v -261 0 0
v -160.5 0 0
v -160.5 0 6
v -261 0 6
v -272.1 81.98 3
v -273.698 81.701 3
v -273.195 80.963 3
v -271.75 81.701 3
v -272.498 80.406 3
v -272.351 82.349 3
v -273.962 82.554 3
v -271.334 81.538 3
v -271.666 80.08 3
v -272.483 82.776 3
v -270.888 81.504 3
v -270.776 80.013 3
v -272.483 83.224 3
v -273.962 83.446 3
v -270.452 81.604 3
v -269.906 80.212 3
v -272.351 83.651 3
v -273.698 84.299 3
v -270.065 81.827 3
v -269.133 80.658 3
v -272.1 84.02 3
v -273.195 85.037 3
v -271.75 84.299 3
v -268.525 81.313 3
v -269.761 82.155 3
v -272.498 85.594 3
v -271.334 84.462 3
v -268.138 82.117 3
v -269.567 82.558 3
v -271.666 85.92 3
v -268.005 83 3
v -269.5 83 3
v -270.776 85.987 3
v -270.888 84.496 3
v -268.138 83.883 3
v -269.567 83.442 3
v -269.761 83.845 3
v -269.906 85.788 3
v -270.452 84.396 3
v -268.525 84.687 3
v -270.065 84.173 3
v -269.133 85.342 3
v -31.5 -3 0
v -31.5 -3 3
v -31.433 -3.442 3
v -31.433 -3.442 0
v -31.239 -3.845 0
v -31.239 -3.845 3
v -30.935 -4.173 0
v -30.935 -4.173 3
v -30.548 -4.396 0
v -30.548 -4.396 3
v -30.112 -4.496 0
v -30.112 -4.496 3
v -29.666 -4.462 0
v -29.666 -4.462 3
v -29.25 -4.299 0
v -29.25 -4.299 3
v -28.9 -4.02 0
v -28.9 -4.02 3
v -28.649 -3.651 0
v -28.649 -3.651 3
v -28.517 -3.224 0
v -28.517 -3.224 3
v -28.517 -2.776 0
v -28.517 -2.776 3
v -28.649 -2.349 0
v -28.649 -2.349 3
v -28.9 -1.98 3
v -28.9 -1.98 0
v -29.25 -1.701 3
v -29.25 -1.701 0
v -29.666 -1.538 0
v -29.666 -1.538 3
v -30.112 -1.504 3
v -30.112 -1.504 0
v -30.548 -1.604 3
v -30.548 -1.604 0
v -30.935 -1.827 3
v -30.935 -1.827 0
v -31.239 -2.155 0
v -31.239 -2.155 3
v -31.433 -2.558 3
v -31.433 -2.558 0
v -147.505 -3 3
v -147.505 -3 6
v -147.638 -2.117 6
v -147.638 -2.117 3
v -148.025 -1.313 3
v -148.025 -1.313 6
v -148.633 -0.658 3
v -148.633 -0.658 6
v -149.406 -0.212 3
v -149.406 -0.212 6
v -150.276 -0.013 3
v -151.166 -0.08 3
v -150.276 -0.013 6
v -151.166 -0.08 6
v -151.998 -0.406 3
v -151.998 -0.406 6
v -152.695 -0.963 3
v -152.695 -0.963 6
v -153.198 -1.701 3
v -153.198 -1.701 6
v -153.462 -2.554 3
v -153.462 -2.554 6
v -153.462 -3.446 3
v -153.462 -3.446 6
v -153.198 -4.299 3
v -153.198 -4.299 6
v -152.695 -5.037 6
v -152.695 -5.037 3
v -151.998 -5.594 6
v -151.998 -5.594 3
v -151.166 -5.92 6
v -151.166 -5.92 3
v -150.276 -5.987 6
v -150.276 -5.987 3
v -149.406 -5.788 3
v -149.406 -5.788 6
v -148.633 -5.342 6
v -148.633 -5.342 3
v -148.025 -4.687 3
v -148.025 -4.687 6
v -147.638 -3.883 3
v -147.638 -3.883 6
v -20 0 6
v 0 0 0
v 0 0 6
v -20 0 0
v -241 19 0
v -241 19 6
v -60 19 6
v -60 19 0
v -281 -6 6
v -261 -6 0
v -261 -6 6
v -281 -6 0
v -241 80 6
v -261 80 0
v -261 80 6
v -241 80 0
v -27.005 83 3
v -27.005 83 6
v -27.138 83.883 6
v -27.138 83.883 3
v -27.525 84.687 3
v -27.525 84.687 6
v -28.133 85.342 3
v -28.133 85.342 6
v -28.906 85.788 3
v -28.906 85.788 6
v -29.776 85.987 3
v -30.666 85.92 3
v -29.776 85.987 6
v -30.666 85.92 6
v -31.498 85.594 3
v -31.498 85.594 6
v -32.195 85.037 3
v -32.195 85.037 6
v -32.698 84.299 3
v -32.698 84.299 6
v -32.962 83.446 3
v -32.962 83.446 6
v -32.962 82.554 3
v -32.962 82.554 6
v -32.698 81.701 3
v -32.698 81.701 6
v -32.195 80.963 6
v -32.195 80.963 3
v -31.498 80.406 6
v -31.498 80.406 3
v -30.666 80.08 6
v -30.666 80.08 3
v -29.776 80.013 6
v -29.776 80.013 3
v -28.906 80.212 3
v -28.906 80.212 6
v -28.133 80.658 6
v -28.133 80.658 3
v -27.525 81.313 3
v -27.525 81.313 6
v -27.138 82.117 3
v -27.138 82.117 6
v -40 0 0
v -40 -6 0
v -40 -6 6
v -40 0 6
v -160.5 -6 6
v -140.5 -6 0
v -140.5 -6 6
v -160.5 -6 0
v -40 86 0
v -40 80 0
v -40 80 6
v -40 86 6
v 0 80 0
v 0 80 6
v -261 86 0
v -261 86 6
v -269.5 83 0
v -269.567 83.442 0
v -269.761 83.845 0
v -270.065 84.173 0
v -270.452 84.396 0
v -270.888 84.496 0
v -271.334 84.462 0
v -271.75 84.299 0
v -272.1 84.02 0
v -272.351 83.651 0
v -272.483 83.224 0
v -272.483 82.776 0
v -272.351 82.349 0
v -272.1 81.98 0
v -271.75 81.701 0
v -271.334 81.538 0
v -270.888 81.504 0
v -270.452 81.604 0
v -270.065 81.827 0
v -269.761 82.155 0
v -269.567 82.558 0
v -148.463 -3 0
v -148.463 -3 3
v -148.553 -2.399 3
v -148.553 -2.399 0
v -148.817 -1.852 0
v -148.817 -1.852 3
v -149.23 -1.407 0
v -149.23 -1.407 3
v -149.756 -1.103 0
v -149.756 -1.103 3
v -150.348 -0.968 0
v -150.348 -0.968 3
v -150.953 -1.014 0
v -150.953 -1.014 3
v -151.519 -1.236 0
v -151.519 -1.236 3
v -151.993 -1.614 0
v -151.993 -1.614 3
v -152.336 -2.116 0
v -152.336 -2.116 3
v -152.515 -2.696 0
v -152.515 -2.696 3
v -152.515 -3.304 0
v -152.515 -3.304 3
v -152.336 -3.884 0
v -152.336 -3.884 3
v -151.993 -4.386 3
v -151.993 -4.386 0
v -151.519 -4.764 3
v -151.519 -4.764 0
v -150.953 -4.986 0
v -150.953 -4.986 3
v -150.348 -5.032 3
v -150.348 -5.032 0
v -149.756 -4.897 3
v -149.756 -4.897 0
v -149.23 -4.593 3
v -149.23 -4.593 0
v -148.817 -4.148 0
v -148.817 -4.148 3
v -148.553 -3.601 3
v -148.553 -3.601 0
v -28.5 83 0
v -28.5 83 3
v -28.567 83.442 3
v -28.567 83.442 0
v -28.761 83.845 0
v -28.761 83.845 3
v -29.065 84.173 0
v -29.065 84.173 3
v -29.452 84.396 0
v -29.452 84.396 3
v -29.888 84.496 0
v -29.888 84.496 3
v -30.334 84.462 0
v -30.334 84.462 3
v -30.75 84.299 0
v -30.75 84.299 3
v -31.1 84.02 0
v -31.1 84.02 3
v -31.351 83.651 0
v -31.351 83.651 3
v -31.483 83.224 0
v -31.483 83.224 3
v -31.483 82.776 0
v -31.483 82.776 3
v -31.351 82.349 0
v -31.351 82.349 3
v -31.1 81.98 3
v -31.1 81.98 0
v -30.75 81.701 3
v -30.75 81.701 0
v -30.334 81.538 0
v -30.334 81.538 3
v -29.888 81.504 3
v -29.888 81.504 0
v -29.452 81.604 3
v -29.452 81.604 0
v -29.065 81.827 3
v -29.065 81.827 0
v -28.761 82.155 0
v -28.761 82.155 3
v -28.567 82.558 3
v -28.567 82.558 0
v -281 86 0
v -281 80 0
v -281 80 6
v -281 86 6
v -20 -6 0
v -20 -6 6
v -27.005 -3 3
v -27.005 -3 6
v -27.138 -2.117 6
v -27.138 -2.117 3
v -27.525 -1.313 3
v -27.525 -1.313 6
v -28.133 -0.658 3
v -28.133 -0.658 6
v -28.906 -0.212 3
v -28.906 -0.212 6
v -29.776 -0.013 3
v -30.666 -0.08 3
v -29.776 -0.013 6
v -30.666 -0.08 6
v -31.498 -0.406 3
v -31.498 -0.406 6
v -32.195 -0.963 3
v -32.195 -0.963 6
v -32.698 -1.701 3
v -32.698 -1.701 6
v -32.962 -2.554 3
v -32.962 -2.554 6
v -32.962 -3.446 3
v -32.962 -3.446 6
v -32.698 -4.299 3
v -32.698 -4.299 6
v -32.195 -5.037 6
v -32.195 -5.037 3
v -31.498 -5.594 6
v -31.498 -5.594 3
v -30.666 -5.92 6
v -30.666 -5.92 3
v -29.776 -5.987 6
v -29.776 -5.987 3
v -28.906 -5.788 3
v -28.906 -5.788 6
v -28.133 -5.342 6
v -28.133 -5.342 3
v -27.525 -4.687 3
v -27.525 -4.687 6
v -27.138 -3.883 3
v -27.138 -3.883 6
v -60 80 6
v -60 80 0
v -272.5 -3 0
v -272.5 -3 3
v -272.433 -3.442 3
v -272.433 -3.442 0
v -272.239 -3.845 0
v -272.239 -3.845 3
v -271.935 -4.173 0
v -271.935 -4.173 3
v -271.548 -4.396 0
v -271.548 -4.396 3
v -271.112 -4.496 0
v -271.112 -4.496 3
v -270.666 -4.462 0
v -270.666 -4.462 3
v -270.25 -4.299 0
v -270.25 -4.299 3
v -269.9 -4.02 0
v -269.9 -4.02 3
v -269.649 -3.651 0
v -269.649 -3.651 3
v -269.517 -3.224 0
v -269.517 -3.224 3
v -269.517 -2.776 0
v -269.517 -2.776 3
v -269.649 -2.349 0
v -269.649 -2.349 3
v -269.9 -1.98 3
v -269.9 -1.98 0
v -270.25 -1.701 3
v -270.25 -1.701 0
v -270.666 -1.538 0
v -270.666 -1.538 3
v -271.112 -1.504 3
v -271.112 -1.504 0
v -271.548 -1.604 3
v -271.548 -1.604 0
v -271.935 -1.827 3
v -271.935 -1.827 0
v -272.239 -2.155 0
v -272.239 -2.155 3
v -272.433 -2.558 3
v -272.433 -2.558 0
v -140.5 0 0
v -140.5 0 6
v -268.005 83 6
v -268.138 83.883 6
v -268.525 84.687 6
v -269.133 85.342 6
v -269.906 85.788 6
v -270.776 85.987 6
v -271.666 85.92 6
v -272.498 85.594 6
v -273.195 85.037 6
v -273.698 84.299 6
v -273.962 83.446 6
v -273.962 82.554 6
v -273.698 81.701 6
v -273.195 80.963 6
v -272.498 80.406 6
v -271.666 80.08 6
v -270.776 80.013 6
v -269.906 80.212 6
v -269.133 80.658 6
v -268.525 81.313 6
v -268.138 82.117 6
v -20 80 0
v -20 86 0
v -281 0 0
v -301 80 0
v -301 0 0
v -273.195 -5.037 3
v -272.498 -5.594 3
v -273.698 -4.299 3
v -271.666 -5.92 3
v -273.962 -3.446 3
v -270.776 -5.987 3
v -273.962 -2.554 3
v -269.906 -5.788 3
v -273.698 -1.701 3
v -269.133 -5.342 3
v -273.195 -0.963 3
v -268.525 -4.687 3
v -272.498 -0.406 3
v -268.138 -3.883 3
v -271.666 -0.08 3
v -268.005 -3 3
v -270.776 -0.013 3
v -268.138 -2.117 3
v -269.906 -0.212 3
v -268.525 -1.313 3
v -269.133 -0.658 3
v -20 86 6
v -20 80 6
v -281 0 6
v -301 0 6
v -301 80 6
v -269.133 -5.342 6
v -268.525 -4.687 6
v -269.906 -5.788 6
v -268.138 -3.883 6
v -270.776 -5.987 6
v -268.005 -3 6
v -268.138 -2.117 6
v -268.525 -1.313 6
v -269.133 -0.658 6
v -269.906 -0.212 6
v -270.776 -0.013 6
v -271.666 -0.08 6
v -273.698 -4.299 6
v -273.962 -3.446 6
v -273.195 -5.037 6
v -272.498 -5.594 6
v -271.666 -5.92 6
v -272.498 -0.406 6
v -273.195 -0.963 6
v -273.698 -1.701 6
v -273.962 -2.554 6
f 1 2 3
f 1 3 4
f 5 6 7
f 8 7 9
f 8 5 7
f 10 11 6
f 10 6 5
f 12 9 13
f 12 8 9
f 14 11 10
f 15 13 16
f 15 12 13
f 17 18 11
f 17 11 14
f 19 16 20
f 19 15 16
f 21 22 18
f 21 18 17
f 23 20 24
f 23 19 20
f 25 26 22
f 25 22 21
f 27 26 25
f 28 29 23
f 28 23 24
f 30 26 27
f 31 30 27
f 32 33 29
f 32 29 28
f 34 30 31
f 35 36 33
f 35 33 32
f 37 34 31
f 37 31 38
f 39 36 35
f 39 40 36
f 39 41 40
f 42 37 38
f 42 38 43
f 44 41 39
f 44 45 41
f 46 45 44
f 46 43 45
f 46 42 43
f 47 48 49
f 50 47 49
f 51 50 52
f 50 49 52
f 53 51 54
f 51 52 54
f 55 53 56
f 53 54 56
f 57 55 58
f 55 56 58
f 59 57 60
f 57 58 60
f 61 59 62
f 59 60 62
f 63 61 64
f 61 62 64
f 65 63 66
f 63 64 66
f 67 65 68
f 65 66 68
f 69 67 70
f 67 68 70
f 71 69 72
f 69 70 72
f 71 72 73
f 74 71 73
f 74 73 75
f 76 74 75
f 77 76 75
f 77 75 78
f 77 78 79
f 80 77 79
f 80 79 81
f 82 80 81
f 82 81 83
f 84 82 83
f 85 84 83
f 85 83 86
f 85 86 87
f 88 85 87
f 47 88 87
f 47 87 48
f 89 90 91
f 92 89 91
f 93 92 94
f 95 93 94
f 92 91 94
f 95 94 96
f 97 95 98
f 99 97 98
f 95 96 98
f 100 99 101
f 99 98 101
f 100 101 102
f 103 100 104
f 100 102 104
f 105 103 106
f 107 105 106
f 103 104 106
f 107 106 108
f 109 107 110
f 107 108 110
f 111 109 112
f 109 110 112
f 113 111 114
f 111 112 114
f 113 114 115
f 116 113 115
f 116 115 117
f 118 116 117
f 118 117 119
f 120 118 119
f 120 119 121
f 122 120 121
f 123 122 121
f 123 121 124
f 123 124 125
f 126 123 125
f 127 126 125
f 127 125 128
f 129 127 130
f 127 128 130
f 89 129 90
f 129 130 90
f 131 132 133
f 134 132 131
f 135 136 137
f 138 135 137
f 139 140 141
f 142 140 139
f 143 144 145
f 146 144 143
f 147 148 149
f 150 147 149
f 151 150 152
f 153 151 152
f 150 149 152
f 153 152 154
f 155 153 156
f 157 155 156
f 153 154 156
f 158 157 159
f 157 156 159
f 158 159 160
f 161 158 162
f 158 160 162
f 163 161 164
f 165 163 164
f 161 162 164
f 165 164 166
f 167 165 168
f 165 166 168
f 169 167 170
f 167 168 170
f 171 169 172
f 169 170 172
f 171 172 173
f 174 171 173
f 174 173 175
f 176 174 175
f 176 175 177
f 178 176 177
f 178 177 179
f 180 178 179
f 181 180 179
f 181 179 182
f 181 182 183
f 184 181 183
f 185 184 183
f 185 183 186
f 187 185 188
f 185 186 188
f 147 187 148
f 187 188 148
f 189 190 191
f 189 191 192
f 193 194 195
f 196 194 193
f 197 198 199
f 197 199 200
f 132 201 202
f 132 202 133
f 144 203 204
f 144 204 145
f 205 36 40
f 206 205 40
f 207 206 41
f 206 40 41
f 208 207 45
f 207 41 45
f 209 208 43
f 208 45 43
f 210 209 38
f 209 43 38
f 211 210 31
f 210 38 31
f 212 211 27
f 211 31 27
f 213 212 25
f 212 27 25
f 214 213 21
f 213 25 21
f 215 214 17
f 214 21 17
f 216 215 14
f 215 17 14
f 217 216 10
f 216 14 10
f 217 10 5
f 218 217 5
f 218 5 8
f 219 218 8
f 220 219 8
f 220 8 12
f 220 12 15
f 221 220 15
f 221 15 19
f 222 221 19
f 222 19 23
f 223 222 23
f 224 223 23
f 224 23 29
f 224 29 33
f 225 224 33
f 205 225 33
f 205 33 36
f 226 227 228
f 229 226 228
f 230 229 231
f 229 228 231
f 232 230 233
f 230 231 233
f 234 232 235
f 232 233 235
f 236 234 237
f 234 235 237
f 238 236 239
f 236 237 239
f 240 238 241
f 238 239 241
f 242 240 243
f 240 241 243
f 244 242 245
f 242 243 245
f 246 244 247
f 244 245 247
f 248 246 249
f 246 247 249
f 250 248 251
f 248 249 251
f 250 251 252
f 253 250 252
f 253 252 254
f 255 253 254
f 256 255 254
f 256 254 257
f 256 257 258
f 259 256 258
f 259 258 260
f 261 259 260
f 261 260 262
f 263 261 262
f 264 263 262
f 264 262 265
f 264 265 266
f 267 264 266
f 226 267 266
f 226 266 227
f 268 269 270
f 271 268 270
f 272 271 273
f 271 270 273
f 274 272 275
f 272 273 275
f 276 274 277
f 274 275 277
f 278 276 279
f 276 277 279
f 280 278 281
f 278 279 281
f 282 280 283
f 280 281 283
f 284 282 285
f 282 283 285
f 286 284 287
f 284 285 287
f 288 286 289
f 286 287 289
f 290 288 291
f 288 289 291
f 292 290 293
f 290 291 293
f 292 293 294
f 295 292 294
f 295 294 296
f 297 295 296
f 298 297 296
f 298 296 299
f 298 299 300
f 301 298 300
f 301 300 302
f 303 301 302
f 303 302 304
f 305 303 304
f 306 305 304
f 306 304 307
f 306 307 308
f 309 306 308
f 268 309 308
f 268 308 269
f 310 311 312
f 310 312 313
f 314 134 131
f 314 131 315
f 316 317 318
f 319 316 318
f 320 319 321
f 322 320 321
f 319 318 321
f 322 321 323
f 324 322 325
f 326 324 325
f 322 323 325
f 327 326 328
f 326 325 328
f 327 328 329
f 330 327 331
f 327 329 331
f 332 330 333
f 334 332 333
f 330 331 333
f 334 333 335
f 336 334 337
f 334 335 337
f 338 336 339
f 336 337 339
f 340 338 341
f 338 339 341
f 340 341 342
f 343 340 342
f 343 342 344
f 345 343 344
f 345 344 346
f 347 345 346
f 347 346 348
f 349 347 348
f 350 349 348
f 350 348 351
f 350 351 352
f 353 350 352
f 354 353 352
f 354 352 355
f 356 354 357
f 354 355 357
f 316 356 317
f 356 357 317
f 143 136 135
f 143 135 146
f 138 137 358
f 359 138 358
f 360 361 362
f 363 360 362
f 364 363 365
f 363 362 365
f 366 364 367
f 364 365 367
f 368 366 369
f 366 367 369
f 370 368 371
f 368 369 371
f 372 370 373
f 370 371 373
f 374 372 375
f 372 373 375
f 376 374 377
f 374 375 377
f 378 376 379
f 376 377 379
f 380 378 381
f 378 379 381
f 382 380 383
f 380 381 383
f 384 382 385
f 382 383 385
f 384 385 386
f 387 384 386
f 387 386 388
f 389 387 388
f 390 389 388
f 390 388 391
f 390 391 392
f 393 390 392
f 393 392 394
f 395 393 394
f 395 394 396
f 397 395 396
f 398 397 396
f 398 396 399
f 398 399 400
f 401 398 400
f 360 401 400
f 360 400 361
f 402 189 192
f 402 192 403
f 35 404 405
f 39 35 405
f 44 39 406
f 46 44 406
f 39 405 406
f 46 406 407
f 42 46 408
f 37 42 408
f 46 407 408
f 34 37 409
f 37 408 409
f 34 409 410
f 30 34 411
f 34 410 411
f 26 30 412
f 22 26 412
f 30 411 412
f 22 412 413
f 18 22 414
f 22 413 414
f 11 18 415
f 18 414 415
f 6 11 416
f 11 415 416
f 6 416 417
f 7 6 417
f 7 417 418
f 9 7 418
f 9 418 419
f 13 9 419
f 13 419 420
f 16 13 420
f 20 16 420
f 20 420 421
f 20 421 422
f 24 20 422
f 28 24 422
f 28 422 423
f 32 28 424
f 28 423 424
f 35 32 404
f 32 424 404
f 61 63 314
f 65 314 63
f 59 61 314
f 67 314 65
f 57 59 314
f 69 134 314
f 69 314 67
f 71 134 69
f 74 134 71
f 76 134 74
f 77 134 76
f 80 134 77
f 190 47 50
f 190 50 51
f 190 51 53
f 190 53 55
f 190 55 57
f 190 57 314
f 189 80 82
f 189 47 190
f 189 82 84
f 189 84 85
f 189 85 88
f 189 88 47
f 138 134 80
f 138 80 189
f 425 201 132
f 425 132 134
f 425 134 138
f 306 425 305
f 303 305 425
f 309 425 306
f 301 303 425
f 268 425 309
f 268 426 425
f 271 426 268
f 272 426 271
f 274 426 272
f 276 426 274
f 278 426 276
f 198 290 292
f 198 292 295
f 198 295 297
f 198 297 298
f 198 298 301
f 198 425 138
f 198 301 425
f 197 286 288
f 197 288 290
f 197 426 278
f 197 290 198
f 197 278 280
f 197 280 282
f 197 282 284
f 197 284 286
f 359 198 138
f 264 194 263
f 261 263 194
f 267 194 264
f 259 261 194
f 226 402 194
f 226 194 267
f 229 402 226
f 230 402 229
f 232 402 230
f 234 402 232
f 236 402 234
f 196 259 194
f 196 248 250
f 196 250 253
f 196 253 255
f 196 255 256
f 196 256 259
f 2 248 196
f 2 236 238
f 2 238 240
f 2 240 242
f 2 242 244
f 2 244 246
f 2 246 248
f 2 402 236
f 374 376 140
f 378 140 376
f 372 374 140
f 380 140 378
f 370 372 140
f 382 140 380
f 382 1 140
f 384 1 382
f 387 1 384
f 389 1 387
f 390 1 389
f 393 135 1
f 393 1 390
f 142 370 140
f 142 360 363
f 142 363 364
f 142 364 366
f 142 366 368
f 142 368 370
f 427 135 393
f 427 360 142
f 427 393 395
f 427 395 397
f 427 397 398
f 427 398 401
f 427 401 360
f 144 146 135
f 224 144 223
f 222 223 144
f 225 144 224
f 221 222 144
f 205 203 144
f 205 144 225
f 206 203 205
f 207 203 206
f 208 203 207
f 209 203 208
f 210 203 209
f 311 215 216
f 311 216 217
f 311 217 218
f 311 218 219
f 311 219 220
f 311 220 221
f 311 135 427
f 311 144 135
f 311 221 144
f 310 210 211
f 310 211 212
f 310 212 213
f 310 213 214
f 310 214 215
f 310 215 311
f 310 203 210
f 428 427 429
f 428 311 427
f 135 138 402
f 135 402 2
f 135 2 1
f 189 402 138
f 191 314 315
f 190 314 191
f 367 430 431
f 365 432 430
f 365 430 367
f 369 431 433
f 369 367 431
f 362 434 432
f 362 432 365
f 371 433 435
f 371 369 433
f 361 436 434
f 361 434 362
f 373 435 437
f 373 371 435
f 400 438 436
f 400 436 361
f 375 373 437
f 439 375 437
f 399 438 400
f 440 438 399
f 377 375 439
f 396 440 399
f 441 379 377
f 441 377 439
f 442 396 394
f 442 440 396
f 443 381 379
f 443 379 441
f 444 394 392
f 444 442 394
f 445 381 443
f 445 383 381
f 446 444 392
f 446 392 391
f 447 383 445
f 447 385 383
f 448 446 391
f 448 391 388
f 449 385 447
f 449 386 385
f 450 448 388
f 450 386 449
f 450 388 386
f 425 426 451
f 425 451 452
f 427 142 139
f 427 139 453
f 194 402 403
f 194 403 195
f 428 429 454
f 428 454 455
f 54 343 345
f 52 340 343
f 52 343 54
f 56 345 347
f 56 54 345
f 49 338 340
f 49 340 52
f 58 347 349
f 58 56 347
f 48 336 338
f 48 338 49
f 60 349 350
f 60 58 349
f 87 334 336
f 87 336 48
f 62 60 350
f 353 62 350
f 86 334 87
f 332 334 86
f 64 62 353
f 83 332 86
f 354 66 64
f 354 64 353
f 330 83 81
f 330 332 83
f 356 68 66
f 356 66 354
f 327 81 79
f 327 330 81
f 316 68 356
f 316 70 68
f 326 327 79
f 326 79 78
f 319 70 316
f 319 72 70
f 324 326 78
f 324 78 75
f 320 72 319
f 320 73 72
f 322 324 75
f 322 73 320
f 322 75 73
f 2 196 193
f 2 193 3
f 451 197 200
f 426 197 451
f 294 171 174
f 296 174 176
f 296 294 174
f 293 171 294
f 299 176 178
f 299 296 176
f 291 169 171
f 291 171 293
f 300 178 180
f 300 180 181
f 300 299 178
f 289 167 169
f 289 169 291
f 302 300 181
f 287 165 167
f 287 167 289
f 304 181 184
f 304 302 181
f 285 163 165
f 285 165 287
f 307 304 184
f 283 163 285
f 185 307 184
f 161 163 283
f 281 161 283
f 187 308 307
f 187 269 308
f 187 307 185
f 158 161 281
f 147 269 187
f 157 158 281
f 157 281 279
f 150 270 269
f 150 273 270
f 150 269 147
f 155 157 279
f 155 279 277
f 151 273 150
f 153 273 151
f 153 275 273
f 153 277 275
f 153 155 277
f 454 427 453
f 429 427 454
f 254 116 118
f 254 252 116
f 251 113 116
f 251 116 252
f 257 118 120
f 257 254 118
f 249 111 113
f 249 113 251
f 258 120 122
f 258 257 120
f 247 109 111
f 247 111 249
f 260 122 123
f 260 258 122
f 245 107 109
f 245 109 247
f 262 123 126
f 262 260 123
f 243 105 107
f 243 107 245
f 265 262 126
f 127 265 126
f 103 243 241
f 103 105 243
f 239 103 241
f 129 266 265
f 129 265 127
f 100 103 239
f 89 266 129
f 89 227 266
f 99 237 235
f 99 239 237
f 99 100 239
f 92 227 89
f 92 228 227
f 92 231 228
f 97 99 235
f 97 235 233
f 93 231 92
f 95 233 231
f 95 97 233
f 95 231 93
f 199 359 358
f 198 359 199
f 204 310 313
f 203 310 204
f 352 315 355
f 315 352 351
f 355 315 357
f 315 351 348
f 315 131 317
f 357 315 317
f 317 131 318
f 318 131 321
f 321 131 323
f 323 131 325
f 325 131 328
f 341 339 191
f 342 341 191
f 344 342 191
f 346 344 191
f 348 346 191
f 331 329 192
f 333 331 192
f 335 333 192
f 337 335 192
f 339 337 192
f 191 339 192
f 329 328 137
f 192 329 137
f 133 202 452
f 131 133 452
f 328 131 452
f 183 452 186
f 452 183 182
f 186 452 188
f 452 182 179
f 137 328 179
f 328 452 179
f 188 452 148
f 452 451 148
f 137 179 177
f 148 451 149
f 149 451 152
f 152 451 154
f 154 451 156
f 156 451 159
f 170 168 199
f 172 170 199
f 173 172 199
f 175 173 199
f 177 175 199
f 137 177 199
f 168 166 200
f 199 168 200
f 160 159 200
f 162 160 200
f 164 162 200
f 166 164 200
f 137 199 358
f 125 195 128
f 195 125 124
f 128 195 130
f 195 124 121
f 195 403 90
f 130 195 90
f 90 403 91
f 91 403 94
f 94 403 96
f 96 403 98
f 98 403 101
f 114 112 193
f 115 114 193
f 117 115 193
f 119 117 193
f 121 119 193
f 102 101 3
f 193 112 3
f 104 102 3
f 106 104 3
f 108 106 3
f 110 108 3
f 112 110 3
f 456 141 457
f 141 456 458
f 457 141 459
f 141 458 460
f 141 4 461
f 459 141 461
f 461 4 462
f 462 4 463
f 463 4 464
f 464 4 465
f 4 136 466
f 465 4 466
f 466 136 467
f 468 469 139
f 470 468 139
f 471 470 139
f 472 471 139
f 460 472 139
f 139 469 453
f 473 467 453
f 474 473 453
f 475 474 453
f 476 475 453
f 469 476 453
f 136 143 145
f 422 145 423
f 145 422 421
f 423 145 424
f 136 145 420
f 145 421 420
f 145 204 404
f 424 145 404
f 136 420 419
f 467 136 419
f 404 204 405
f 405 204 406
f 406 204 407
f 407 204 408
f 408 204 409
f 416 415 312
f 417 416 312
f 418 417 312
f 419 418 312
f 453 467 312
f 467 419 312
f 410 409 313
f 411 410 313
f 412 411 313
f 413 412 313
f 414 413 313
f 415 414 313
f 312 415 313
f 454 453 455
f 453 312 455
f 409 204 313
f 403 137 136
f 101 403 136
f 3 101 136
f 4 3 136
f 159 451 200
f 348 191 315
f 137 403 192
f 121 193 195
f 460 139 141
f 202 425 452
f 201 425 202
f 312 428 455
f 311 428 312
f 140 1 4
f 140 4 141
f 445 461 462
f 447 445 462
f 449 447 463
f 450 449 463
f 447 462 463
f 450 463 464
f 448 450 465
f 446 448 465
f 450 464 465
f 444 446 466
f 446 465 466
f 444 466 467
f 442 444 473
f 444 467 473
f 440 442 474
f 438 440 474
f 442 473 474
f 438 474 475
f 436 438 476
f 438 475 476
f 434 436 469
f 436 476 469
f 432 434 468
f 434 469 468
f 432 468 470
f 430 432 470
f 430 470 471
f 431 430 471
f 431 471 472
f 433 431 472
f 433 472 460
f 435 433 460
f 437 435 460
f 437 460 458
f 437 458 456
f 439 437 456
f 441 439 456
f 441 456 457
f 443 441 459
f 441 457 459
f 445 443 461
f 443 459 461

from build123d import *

# Parameters (mm, degrees)
BOSS_EXTRU_1_DEPTH      = 6
ESQUISSE2_W             = 181
ESQUISSE2_H             = 61
ENL_V_MAT_EXTRU_1_DEPTH = 314.10221973
ESQUISSE4_R             = 1.5
ESQUISSE4_R_2           = 2.037365752
ENL_V_MAT_EXTRU_2_DEPTH = 314.10221973
ESQUISSE5_R             = 2.995
ENL_V_MAT_EXTRU_3_DEPTH = 3


with BuildPart() as part:
    # Esquisse1 → Boss.-Extru.1 (new body)
    with BuildSketch(Plane.XY):
        Polygon((-301, 80), (-281, 80), (-281, 86), (-261, 86), (-261, 80), (-40, 80), (-40, 86), (-20, 86), (-20, 80), (0, 80), (0, 0), (-20, 0), (-20, -6), (-40, -6), (-40, 0), (-140.5, 0), (-140.5, -6), (-160.5, -6), (-160.5, 0), (-261, 0), (-261, -6), (-281, -6), (-281, 0), (-301, 0), align=None)
    extrude(amount=BOSS_EXTRU_1_DEPTH)

    # Esquisse2 → Enlèv. mat.-Extru.1 (cut, through all)
    with BuildSketch(Plane.XY.offset(6)):
        with Locations((-150.5, 49.5)):
            Rectangle(ESQUISSE2_W, ESQUISSE2_H)
    extrude(amount=-ENL_V_MAT_EXTRU_1_DEPTH, mode=Mode.SUBTRACT)

    # Esquisse4 → Enlèv. mat.-Extru.2 (cut, through all)
    with BuildSketch(Plane.XY.offset(6)):
        with Locations((-271, 83)):
            Circle(ESQUISSE4_R)
        with Locations((-30, 83)):
            Circle(ESQUISSE4_R)
        with Locations(Location((-30, -3, 0), (0, 0, 180))):
            Circle(ESQUISSE4_R)
        with Locations(Location((-271, -3, 0), (0, 0, 180))):
            Circle(ESQUISSE4_R)
        with Locations((-150.5, -3)):
            Circle(ESQUISSE4_R_2)
    extrude(amount=-ENL_V_MAT_EXTRU_2_DEPTH, mode=Mode.SUBTRACT)

    # Esquisse5 → Enlèv. mat.-Extru.3 (cut)
    with BuildSketch(Plane.XY.offset(6)):
        with Locations((-271, 83)):
            Circle(ESQUISSE5_R)
        with Locations((-30, 83)):
            Circle(ESQUISSE5_R)
        with Locations((-271, -3)):
            Circle(ESQUISSE5_R)
        with Locations((-150.5, -3)):
            Circle(ESQUISSE5_R)
        with Locations((-30, -3)):
            Circle(ESQUISSE5_R)
    extrude(amount=-ENL_V_MAT_EXTRU_3_DEPTH, mode=Mode.SUBTRACT)


solid = part.part
